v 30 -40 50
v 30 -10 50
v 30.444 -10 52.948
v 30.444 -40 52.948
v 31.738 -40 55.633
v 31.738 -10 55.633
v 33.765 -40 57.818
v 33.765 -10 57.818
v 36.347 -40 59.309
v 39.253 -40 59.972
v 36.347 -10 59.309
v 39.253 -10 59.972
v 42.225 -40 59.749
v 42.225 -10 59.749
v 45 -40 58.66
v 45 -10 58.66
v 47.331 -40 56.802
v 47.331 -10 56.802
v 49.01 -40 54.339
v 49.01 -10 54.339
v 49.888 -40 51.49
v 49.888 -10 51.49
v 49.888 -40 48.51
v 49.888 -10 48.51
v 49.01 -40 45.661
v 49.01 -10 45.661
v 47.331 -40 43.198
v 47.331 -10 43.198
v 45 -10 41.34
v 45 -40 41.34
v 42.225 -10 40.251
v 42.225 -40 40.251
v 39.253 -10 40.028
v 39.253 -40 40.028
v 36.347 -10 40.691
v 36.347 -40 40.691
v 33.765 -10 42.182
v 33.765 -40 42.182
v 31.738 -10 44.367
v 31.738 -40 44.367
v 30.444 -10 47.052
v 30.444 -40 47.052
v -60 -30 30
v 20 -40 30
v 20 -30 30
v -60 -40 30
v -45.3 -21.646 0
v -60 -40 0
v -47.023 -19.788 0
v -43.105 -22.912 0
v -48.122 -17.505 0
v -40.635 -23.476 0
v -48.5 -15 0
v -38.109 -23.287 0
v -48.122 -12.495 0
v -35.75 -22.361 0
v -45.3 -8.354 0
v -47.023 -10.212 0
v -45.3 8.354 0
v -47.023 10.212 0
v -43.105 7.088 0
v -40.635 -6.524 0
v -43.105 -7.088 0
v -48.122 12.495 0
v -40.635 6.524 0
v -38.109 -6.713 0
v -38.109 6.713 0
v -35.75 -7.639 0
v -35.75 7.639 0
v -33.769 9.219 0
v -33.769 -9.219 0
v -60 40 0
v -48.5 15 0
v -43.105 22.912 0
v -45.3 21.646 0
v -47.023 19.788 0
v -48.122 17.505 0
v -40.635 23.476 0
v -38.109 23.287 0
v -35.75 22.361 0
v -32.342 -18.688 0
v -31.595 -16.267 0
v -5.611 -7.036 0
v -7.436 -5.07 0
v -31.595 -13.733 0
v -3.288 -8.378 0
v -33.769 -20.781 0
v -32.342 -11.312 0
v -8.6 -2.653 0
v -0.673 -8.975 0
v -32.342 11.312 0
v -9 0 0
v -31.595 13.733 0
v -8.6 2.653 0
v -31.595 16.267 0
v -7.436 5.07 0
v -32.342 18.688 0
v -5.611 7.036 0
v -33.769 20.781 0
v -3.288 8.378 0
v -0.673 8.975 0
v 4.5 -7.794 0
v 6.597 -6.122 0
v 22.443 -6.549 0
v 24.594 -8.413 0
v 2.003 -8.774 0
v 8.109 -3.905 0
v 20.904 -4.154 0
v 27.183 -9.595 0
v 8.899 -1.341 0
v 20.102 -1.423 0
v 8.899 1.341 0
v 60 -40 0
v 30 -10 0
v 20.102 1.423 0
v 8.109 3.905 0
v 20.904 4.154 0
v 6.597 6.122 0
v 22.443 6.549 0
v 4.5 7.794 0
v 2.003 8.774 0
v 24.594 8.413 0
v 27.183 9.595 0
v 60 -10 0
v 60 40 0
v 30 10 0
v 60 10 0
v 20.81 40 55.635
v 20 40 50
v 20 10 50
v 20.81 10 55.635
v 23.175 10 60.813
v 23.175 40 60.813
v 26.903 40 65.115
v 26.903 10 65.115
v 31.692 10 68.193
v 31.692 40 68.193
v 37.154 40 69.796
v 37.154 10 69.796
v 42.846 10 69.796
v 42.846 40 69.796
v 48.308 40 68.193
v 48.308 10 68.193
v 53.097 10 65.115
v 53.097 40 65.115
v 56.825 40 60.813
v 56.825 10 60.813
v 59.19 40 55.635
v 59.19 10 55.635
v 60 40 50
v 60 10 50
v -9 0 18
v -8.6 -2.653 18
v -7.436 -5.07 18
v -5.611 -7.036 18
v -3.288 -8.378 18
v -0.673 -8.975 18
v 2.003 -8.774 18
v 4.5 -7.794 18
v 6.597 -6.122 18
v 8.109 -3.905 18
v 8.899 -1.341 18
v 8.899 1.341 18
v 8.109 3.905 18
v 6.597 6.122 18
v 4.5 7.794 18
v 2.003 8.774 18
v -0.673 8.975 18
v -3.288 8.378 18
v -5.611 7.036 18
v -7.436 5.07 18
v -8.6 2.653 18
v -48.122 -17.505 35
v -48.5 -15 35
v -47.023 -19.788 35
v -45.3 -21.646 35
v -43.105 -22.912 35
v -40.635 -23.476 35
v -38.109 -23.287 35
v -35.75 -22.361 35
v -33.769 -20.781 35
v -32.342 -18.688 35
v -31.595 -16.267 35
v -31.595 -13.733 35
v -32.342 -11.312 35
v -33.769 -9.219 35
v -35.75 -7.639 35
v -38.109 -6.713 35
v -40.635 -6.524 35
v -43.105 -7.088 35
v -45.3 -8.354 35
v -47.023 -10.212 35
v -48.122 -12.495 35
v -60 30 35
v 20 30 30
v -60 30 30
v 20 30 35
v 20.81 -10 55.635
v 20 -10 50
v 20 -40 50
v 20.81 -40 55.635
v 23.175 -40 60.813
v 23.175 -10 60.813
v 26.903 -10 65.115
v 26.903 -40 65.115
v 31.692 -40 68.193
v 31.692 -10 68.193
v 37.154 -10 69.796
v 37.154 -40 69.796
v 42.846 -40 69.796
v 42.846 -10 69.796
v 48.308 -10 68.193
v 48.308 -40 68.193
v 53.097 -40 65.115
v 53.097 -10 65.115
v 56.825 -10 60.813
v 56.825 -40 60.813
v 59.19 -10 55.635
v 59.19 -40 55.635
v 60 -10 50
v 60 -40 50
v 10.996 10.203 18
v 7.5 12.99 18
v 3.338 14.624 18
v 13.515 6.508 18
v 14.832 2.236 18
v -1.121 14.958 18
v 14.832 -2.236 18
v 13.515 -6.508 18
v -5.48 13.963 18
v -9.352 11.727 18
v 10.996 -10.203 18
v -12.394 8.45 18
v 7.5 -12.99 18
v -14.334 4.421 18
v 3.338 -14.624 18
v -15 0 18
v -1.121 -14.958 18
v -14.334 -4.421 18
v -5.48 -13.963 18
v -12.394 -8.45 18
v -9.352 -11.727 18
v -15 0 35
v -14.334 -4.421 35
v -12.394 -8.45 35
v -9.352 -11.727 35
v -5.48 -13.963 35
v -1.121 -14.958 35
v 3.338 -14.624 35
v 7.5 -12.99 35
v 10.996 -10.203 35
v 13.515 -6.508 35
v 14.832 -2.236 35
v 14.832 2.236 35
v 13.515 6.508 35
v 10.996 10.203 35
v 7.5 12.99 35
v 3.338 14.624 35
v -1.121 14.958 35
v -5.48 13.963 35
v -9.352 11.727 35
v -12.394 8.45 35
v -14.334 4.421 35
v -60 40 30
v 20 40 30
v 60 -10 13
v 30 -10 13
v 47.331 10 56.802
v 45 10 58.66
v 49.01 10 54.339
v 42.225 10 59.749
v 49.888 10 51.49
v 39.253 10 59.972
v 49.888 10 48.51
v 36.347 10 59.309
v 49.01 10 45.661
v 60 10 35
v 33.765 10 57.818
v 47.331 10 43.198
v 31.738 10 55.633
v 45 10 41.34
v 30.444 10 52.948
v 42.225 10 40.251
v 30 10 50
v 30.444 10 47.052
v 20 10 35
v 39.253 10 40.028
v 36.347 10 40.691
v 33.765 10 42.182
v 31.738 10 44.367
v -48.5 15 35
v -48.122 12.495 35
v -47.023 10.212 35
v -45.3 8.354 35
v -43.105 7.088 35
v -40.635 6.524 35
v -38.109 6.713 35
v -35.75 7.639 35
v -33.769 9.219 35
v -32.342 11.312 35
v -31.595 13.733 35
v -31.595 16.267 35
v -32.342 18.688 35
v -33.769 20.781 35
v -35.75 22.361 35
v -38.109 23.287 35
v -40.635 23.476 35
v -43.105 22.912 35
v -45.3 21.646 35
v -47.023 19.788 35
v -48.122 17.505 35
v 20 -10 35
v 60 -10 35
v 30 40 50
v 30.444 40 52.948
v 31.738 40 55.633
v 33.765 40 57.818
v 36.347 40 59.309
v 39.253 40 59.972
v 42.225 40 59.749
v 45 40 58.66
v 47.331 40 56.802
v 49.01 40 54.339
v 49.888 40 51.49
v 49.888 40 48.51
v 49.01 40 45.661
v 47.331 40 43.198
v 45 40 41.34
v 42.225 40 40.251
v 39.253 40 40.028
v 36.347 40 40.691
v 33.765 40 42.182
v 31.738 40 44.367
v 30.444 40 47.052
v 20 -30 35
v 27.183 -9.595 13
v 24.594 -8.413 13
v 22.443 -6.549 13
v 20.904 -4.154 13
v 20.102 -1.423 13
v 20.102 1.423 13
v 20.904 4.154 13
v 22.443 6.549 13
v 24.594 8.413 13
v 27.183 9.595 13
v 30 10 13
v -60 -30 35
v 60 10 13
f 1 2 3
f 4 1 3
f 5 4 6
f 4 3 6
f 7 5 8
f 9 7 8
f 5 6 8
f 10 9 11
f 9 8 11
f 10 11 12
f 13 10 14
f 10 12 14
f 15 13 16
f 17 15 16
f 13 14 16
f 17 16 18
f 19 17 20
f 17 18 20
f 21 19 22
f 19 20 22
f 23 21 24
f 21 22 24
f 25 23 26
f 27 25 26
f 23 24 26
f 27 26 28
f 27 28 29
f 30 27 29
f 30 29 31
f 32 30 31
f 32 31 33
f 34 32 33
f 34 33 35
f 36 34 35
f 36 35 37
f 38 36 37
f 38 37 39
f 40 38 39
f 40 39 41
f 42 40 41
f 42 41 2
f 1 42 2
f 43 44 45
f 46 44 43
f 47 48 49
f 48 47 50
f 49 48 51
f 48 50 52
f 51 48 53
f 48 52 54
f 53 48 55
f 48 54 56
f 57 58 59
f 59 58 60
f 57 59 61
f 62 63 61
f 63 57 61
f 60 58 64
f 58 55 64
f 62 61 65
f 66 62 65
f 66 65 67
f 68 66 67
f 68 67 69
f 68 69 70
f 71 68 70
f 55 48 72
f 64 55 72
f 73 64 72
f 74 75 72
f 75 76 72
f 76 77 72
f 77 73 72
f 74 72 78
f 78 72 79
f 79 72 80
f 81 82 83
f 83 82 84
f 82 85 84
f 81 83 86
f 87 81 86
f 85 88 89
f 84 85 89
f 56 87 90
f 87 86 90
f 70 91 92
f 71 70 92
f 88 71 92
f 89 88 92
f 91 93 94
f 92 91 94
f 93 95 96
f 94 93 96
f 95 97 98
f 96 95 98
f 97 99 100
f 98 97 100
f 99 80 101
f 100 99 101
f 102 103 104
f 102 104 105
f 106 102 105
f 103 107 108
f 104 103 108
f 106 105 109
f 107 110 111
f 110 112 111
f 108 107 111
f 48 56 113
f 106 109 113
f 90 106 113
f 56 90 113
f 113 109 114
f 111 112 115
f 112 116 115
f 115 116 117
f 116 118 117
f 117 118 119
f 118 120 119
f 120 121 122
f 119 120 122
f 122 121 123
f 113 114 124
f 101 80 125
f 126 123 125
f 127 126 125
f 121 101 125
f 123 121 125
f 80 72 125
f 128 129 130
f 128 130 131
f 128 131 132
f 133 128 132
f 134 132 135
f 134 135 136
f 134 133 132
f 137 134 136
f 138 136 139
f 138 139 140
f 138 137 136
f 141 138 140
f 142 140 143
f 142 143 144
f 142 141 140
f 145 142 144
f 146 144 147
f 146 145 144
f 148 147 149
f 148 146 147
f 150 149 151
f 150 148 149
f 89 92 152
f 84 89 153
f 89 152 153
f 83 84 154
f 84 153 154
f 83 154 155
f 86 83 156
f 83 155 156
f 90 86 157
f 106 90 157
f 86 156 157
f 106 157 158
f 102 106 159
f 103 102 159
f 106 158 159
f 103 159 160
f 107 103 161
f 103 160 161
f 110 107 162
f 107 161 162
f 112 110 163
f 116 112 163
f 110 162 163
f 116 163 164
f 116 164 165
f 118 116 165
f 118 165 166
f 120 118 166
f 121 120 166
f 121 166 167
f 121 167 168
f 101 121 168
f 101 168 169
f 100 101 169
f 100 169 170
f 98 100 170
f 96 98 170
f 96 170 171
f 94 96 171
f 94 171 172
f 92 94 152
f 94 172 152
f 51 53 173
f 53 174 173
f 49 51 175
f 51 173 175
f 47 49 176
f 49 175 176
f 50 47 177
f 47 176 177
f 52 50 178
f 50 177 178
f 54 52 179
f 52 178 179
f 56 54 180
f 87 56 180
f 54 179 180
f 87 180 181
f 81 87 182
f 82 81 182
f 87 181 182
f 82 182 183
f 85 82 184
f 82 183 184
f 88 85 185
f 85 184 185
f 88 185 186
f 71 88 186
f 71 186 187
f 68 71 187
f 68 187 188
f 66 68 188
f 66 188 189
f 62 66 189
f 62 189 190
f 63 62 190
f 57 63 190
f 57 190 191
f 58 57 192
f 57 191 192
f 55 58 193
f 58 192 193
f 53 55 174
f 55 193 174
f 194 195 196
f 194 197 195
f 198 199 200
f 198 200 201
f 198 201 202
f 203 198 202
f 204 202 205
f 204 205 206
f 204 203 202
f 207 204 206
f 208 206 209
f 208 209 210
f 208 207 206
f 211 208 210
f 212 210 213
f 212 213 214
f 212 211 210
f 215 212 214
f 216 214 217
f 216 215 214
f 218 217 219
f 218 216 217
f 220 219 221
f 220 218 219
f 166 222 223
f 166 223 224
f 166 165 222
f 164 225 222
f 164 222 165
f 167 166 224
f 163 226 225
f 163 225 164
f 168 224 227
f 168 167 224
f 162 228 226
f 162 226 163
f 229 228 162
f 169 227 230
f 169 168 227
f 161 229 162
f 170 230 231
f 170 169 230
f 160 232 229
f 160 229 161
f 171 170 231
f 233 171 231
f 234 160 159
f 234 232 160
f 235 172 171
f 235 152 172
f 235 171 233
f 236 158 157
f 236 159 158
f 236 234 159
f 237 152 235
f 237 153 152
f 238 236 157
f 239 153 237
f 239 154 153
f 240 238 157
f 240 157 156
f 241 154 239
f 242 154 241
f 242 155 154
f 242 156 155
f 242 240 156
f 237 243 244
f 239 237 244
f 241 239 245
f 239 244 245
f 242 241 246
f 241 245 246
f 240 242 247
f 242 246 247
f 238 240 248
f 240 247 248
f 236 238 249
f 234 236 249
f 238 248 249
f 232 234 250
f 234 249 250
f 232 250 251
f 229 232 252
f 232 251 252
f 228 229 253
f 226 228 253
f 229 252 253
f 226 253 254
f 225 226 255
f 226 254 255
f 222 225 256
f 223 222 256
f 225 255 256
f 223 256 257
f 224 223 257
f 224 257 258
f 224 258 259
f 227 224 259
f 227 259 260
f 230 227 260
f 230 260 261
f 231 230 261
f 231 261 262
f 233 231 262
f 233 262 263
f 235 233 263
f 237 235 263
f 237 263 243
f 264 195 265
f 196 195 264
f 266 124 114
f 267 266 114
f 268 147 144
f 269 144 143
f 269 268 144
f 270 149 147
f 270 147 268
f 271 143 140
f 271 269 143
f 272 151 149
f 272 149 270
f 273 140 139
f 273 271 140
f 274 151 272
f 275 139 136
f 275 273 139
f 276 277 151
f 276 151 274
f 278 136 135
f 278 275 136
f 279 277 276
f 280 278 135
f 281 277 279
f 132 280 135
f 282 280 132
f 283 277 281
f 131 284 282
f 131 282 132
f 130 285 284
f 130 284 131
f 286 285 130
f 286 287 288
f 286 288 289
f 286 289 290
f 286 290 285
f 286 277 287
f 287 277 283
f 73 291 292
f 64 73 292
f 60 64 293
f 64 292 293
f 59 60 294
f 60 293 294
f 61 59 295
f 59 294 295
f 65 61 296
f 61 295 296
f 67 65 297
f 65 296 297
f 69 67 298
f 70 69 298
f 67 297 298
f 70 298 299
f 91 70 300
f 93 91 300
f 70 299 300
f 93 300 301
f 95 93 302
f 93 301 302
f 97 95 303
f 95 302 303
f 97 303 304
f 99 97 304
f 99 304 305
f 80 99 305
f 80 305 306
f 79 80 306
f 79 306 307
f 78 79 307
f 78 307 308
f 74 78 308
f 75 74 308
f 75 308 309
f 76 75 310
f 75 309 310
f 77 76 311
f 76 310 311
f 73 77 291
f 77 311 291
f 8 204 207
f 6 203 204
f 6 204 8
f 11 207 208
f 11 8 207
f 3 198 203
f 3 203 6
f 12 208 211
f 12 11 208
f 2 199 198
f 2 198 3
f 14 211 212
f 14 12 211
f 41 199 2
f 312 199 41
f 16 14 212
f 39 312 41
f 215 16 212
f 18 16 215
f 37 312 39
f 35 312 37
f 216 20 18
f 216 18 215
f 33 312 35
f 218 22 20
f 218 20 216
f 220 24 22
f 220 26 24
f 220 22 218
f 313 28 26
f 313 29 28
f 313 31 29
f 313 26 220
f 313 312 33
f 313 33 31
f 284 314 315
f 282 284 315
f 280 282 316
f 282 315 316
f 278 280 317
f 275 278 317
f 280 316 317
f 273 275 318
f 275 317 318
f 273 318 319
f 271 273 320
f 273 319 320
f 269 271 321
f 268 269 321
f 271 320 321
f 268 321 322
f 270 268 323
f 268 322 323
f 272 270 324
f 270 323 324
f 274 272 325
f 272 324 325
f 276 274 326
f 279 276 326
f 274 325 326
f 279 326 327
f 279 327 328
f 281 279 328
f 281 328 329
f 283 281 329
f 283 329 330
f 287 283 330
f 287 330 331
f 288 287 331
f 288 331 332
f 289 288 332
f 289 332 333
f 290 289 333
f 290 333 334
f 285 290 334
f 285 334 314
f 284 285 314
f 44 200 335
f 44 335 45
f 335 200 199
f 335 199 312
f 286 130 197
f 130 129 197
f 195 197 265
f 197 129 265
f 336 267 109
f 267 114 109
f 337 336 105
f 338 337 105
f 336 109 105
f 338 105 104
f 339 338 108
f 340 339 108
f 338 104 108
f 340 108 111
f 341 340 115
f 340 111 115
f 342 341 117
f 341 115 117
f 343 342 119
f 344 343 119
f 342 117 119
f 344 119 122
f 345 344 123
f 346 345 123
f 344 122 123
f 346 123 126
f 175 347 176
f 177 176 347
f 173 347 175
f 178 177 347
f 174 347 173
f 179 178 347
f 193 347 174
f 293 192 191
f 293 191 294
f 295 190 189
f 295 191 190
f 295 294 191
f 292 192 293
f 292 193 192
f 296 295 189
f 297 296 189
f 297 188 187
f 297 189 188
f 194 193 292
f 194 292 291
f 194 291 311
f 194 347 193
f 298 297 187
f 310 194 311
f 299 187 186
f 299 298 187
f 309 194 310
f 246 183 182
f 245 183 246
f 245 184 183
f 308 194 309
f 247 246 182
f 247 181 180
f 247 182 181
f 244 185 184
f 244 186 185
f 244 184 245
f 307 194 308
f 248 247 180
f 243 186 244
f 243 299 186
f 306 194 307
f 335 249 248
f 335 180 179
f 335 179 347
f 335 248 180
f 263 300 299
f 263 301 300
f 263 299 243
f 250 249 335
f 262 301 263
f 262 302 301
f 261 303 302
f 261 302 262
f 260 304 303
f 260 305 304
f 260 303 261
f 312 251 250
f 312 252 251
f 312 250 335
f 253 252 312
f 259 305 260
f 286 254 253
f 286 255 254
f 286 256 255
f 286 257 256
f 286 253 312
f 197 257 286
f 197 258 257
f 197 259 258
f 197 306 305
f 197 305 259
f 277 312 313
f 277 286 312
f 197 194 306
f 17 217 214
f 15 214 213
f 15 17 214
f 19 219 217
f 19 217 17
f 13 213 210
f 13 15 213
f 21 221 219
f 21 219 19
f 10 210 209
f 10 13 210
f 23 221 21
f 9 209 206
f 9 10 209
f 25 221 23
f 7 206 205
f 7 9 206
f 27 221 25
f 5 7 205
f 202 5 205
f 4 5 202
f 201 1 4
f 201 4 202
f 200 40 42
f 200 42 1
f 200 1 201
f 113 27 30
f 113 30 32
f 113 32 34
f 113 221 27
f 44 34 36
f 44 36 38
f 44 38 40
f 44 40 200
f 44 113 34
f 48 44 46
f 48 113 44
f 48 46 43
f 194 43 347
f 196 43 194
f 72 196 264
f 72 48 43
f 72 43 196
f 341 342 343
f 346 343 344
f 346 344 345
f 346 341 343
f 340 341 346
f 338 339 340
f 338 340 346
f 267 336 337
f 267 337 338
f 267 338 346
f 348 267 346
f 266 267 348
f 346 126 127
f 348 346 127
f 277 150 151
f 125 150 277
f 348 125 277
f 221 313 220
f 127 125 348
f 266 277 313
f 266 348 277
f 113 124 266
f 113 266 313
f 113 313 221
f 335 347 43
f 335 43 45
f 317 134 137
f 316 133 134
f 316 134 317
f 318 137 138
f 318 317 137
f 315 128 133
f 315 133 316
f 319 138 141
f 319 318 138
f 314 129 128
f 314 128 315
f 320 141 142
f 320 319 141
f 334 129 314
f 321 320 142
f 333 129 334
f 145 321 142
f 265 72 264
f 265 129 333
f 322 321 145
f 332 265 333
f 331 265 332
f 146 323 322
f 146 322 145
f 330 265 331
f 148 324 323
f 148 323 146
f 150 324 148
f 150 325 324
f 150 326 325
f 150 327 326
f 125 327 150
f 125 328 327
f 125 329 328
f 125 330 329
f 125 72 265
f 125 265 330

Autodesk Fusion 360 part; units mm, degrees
sketch "Sketch1" plane through (0, 0, 0) normal (0, 0, 1) x (1, 0, 0)
  line L0 (0, 0) -> (-60, 0)
  line L1 (-60, 0) -> (60, 0)
  line L2 (-60, 0) -> (-60, 40)
  line L3 (60, 0) -> (60, -40)
  line L4 (-60, 40) -> (60, 40)
  line L5 (60, 40) -> (60, -40)
  line L6 (60, -40) -> (-60, -40)
  line L7 (-60, -40) -> (-60, 40)
  dimension "d1" = 60
  dimension "d2" = 120
  dimension "d3" = 40
  dimension "d4" = 40
extrude "Extrude1" add sketch "Sketch1" along normal blind 35
sketch "Sketch2" plane through (0, 0, 35) normal (0, 0, 1) x (-1, 0, 0)
  line L0 (60, 40) -> (-60, 40)
  line L1 (-60, 40) -> (-60, -40)
  line L2 (-60, -40) -> (60, -40)
  line L3 (60, -40) -> (60, 40)
  line L4 (-60, -40) -> (40, -40)
  line L5 (60, 0) -> (60, -15)
  line L6 (60, 0) -> (60, 15)
  circle A0 centre (40, -15) radius 8.5
  circle A1 centre (40, 15) radius 8.5
  dimension "d10" = 17
  dimension "d11" = 17
extrude "Extrude2" cut sketch "Sketch2" against normal blind 70 contours A0 | A1
sketch "Sketch3" plane through (0, 0, 35) normal (0, 0, 1) x (-1, 0, 0)
  circle A0 centre (40, -15) radius 8.5
  circle A1 centre (40, 15) radius 8.5
  line L0 (60, 40) -> (-60, 40)
  line L1 (-60, 40) -> (-60, -40)
  line L2 (-60, -40) -> (60, -40)
  line L3 (60, -40) -> (60, 40)
  line L4 (-60, 40) -> (0, 40)
  circle A2 centre (0, 0) radius 9
  dimension "d14" = 60
  dimension "d15" = 18
extrude "Extrude3" cut sketch "Sketch3" against normal blind 55 contours A2
sketch "Sketch4" plane through (0, 0, 35) normal (0, 0, 1) x (-1, 0, 0)
  circle A0 centre (0, 0) radius 9
  circle A1 centre (40, -15) radius 8.5
  circle A2 centre (40, 15) radius 8.5
  line L0 (60, 40) -> (-60, 40)
  line L1 (-60, 40) -> (-60, -40)
  line L2 (-60, -40) -> (60, -40)
  line L3 (60, -40) -> (60, 40)
  circle A3 centre (0, 0) radius 15
  dimension "d18" = 30
extrude "Extrude4" cut sketch "Sketch4" against normal blind 17 contours A3
sketch "Sketch5" plane through (0, 40, 0) normal (0, 1, 0) x (-1, 0, 0)
  line L0 (-60, 0) -> (60, 0)
  line L1 (60, 0) -> (60, 35)
  line L2 (60, 35) -> (-60, 35)
  line L3 (-60, 35) -> (-60, 0)
  line L4 (-60, 0) -> (-40, 0)
  line L5 (-60, 0) -> (-60, 50)
  line L6 (-20, 50) -> (-20, 0)
  arc A0 (-20, 50) -> (-60, 50) centre (-40, 50) ccw
  dimension "d21" = 20
  dimension "d22" = 50
  dimension "d23" = 40
extrude "Extrude5" add sketch "Sketch5" against normal blind 80 contours L0 L2 L3 L4 L5 L6 | L2 L5 L6 A0
sketch "Sketch6" plane through (0, 40, 0) normal (0, 1, 0) x (-1, 0, 0)
  line L0 (-60, 0) -> (60, 0)
  line L1 (60, 0) -> (60, 35)
  line L2 (60, 35) -> (-20, 35)
  line L3 (-20, 35) -> (-20, 50)
  arc A0 (-20, 50) -> (-60, 50) centre (-40, 50) ccw
  line L4 (-60, 50) -> (-60, 0)
  circle A1 centre (-40, 50) radius 10
  dimension "d26" = 20
extrude "Extrude6" cut sketch "Sketch6" against normal blind 95 contours A1
sketch "Sketch7" plane through (0, 0, 35) normal (0, 0, 1) x (-1, 0, 0)
  line L0 (-20, 40) -> (-20, -40)
  line L1 (-20, -40) -> (60, -40)
  line L2 (60, -40) -> (60, 40)
  line L3 (60, 40) -> (-20, 40)
  circle A0 centre (0, 0) radius 15
  circle A1 centre (40, -15) radius 8.5
  circle A2 centre (40, 15) radius 8.5
  line L4 (60, 40) -> (60, 30) construction
  line L5 (60, -40) -> (60, -30) construction
  line L6 (60, -40) -> (-20, -40)
  line L7 (-20, -40) -> (-20, -30)
  line L8 (-20, -30) -> (60, -30)
  line L9 (60, -30) -> (60, -40)
  line L10 (60, 30) -> (-20, 30)
  line L11 (-20, 30) -> (-20, 40)
  line L12 (-20, 40) -> (60, 40)
  line L13 (60, 40) -> (60, 30)
extrude "Extrude7" cut sketch "Sketch7" against normal blind 5 contours L0 L2 L3 L10 L11 L12 L13 | L0 L1 L2 L6 L7 L8 L9
ref_plane "WorkPlane1" through (0, 0, 35) normal (0, 0, 1) x (1, 0, 0)
sketch "Sketch8" plane through (0, 0, 35) normal (0, 0, 1) x (1, 0, 0)
  line L0 (60, -40) -> (-60, -40)
  line L1 (-60, -40) -> (-60, 40)
  line L2 (-60, 40) -> (60, 40)
  line L3 (60, 40) -> (60, -40)
  circle A0 centre (-40, -15) radius 8.5
  circle A1 centre (-40, 15) radius 8.5
  circle A2 centre (0, 0) radius 9
  line L4 (60, 0) -> (30, 0) construction
  line L5 (30, 0) -> (20, 0) construction
  line L6 (20, 0) -> (20, 10) construction
  line L7 (20, 10) -> (20, -10)
  line L8 (20, -10) -> (67.6256, -10)
  line L9 (67.6256, -10) -> (67.6256, 10)
  line L10 (67.6256, 10) -> (20, 10)
  dimension "d33" = 30
  dimension "d34" = 10
  dimension "d35" = 20
extrude "Extrude8" cut sketch "Sketch8" along normal blind 90 contours L3 L7 L8 L10 | L3 L8 L9 L10
sketch "Sketch9" plane through (0, 0, 0) normal (0, 0, -1) x (1, 0, 0)
  line L0 (60, 40) -> (-60, 40)
  line L1 (-60, 40) -> (-60, -40)
  line L2 (-60, -40) -> (60, -40)
  line L3 (60, -40) -> (60, 40)
  circle A0 centre (-40, 15) radius 8.5
  circle A1 centre (-40, -15) radius 8.5
  circle A2 centre (0, 0) radius 9
  line L4 (60, 0) -> (20, 0) construction
  line L5 (60, 0) -> (30, 0) construction
  line L6 (30, -10) -> (73.1497, -10)
  arc A3 (73.1497, -10) -> (73.1497, 10) centre (73.1497, 0) ccw
  line L7 (73.1497, 10) -> (30, 10)
  arc A4 (30, 10) -> (30, -10) centre (30, 0) ccw
  line L8 (20, 0) -> (83.1497, 0) construction
  dimension "d38" = 40
  dimension "d39" = 30
  dimension "d40" = 20
extrude "Extrude9" cut sketch "Sketch9" against normal blind 13 contours L3 L6 L7 A4
